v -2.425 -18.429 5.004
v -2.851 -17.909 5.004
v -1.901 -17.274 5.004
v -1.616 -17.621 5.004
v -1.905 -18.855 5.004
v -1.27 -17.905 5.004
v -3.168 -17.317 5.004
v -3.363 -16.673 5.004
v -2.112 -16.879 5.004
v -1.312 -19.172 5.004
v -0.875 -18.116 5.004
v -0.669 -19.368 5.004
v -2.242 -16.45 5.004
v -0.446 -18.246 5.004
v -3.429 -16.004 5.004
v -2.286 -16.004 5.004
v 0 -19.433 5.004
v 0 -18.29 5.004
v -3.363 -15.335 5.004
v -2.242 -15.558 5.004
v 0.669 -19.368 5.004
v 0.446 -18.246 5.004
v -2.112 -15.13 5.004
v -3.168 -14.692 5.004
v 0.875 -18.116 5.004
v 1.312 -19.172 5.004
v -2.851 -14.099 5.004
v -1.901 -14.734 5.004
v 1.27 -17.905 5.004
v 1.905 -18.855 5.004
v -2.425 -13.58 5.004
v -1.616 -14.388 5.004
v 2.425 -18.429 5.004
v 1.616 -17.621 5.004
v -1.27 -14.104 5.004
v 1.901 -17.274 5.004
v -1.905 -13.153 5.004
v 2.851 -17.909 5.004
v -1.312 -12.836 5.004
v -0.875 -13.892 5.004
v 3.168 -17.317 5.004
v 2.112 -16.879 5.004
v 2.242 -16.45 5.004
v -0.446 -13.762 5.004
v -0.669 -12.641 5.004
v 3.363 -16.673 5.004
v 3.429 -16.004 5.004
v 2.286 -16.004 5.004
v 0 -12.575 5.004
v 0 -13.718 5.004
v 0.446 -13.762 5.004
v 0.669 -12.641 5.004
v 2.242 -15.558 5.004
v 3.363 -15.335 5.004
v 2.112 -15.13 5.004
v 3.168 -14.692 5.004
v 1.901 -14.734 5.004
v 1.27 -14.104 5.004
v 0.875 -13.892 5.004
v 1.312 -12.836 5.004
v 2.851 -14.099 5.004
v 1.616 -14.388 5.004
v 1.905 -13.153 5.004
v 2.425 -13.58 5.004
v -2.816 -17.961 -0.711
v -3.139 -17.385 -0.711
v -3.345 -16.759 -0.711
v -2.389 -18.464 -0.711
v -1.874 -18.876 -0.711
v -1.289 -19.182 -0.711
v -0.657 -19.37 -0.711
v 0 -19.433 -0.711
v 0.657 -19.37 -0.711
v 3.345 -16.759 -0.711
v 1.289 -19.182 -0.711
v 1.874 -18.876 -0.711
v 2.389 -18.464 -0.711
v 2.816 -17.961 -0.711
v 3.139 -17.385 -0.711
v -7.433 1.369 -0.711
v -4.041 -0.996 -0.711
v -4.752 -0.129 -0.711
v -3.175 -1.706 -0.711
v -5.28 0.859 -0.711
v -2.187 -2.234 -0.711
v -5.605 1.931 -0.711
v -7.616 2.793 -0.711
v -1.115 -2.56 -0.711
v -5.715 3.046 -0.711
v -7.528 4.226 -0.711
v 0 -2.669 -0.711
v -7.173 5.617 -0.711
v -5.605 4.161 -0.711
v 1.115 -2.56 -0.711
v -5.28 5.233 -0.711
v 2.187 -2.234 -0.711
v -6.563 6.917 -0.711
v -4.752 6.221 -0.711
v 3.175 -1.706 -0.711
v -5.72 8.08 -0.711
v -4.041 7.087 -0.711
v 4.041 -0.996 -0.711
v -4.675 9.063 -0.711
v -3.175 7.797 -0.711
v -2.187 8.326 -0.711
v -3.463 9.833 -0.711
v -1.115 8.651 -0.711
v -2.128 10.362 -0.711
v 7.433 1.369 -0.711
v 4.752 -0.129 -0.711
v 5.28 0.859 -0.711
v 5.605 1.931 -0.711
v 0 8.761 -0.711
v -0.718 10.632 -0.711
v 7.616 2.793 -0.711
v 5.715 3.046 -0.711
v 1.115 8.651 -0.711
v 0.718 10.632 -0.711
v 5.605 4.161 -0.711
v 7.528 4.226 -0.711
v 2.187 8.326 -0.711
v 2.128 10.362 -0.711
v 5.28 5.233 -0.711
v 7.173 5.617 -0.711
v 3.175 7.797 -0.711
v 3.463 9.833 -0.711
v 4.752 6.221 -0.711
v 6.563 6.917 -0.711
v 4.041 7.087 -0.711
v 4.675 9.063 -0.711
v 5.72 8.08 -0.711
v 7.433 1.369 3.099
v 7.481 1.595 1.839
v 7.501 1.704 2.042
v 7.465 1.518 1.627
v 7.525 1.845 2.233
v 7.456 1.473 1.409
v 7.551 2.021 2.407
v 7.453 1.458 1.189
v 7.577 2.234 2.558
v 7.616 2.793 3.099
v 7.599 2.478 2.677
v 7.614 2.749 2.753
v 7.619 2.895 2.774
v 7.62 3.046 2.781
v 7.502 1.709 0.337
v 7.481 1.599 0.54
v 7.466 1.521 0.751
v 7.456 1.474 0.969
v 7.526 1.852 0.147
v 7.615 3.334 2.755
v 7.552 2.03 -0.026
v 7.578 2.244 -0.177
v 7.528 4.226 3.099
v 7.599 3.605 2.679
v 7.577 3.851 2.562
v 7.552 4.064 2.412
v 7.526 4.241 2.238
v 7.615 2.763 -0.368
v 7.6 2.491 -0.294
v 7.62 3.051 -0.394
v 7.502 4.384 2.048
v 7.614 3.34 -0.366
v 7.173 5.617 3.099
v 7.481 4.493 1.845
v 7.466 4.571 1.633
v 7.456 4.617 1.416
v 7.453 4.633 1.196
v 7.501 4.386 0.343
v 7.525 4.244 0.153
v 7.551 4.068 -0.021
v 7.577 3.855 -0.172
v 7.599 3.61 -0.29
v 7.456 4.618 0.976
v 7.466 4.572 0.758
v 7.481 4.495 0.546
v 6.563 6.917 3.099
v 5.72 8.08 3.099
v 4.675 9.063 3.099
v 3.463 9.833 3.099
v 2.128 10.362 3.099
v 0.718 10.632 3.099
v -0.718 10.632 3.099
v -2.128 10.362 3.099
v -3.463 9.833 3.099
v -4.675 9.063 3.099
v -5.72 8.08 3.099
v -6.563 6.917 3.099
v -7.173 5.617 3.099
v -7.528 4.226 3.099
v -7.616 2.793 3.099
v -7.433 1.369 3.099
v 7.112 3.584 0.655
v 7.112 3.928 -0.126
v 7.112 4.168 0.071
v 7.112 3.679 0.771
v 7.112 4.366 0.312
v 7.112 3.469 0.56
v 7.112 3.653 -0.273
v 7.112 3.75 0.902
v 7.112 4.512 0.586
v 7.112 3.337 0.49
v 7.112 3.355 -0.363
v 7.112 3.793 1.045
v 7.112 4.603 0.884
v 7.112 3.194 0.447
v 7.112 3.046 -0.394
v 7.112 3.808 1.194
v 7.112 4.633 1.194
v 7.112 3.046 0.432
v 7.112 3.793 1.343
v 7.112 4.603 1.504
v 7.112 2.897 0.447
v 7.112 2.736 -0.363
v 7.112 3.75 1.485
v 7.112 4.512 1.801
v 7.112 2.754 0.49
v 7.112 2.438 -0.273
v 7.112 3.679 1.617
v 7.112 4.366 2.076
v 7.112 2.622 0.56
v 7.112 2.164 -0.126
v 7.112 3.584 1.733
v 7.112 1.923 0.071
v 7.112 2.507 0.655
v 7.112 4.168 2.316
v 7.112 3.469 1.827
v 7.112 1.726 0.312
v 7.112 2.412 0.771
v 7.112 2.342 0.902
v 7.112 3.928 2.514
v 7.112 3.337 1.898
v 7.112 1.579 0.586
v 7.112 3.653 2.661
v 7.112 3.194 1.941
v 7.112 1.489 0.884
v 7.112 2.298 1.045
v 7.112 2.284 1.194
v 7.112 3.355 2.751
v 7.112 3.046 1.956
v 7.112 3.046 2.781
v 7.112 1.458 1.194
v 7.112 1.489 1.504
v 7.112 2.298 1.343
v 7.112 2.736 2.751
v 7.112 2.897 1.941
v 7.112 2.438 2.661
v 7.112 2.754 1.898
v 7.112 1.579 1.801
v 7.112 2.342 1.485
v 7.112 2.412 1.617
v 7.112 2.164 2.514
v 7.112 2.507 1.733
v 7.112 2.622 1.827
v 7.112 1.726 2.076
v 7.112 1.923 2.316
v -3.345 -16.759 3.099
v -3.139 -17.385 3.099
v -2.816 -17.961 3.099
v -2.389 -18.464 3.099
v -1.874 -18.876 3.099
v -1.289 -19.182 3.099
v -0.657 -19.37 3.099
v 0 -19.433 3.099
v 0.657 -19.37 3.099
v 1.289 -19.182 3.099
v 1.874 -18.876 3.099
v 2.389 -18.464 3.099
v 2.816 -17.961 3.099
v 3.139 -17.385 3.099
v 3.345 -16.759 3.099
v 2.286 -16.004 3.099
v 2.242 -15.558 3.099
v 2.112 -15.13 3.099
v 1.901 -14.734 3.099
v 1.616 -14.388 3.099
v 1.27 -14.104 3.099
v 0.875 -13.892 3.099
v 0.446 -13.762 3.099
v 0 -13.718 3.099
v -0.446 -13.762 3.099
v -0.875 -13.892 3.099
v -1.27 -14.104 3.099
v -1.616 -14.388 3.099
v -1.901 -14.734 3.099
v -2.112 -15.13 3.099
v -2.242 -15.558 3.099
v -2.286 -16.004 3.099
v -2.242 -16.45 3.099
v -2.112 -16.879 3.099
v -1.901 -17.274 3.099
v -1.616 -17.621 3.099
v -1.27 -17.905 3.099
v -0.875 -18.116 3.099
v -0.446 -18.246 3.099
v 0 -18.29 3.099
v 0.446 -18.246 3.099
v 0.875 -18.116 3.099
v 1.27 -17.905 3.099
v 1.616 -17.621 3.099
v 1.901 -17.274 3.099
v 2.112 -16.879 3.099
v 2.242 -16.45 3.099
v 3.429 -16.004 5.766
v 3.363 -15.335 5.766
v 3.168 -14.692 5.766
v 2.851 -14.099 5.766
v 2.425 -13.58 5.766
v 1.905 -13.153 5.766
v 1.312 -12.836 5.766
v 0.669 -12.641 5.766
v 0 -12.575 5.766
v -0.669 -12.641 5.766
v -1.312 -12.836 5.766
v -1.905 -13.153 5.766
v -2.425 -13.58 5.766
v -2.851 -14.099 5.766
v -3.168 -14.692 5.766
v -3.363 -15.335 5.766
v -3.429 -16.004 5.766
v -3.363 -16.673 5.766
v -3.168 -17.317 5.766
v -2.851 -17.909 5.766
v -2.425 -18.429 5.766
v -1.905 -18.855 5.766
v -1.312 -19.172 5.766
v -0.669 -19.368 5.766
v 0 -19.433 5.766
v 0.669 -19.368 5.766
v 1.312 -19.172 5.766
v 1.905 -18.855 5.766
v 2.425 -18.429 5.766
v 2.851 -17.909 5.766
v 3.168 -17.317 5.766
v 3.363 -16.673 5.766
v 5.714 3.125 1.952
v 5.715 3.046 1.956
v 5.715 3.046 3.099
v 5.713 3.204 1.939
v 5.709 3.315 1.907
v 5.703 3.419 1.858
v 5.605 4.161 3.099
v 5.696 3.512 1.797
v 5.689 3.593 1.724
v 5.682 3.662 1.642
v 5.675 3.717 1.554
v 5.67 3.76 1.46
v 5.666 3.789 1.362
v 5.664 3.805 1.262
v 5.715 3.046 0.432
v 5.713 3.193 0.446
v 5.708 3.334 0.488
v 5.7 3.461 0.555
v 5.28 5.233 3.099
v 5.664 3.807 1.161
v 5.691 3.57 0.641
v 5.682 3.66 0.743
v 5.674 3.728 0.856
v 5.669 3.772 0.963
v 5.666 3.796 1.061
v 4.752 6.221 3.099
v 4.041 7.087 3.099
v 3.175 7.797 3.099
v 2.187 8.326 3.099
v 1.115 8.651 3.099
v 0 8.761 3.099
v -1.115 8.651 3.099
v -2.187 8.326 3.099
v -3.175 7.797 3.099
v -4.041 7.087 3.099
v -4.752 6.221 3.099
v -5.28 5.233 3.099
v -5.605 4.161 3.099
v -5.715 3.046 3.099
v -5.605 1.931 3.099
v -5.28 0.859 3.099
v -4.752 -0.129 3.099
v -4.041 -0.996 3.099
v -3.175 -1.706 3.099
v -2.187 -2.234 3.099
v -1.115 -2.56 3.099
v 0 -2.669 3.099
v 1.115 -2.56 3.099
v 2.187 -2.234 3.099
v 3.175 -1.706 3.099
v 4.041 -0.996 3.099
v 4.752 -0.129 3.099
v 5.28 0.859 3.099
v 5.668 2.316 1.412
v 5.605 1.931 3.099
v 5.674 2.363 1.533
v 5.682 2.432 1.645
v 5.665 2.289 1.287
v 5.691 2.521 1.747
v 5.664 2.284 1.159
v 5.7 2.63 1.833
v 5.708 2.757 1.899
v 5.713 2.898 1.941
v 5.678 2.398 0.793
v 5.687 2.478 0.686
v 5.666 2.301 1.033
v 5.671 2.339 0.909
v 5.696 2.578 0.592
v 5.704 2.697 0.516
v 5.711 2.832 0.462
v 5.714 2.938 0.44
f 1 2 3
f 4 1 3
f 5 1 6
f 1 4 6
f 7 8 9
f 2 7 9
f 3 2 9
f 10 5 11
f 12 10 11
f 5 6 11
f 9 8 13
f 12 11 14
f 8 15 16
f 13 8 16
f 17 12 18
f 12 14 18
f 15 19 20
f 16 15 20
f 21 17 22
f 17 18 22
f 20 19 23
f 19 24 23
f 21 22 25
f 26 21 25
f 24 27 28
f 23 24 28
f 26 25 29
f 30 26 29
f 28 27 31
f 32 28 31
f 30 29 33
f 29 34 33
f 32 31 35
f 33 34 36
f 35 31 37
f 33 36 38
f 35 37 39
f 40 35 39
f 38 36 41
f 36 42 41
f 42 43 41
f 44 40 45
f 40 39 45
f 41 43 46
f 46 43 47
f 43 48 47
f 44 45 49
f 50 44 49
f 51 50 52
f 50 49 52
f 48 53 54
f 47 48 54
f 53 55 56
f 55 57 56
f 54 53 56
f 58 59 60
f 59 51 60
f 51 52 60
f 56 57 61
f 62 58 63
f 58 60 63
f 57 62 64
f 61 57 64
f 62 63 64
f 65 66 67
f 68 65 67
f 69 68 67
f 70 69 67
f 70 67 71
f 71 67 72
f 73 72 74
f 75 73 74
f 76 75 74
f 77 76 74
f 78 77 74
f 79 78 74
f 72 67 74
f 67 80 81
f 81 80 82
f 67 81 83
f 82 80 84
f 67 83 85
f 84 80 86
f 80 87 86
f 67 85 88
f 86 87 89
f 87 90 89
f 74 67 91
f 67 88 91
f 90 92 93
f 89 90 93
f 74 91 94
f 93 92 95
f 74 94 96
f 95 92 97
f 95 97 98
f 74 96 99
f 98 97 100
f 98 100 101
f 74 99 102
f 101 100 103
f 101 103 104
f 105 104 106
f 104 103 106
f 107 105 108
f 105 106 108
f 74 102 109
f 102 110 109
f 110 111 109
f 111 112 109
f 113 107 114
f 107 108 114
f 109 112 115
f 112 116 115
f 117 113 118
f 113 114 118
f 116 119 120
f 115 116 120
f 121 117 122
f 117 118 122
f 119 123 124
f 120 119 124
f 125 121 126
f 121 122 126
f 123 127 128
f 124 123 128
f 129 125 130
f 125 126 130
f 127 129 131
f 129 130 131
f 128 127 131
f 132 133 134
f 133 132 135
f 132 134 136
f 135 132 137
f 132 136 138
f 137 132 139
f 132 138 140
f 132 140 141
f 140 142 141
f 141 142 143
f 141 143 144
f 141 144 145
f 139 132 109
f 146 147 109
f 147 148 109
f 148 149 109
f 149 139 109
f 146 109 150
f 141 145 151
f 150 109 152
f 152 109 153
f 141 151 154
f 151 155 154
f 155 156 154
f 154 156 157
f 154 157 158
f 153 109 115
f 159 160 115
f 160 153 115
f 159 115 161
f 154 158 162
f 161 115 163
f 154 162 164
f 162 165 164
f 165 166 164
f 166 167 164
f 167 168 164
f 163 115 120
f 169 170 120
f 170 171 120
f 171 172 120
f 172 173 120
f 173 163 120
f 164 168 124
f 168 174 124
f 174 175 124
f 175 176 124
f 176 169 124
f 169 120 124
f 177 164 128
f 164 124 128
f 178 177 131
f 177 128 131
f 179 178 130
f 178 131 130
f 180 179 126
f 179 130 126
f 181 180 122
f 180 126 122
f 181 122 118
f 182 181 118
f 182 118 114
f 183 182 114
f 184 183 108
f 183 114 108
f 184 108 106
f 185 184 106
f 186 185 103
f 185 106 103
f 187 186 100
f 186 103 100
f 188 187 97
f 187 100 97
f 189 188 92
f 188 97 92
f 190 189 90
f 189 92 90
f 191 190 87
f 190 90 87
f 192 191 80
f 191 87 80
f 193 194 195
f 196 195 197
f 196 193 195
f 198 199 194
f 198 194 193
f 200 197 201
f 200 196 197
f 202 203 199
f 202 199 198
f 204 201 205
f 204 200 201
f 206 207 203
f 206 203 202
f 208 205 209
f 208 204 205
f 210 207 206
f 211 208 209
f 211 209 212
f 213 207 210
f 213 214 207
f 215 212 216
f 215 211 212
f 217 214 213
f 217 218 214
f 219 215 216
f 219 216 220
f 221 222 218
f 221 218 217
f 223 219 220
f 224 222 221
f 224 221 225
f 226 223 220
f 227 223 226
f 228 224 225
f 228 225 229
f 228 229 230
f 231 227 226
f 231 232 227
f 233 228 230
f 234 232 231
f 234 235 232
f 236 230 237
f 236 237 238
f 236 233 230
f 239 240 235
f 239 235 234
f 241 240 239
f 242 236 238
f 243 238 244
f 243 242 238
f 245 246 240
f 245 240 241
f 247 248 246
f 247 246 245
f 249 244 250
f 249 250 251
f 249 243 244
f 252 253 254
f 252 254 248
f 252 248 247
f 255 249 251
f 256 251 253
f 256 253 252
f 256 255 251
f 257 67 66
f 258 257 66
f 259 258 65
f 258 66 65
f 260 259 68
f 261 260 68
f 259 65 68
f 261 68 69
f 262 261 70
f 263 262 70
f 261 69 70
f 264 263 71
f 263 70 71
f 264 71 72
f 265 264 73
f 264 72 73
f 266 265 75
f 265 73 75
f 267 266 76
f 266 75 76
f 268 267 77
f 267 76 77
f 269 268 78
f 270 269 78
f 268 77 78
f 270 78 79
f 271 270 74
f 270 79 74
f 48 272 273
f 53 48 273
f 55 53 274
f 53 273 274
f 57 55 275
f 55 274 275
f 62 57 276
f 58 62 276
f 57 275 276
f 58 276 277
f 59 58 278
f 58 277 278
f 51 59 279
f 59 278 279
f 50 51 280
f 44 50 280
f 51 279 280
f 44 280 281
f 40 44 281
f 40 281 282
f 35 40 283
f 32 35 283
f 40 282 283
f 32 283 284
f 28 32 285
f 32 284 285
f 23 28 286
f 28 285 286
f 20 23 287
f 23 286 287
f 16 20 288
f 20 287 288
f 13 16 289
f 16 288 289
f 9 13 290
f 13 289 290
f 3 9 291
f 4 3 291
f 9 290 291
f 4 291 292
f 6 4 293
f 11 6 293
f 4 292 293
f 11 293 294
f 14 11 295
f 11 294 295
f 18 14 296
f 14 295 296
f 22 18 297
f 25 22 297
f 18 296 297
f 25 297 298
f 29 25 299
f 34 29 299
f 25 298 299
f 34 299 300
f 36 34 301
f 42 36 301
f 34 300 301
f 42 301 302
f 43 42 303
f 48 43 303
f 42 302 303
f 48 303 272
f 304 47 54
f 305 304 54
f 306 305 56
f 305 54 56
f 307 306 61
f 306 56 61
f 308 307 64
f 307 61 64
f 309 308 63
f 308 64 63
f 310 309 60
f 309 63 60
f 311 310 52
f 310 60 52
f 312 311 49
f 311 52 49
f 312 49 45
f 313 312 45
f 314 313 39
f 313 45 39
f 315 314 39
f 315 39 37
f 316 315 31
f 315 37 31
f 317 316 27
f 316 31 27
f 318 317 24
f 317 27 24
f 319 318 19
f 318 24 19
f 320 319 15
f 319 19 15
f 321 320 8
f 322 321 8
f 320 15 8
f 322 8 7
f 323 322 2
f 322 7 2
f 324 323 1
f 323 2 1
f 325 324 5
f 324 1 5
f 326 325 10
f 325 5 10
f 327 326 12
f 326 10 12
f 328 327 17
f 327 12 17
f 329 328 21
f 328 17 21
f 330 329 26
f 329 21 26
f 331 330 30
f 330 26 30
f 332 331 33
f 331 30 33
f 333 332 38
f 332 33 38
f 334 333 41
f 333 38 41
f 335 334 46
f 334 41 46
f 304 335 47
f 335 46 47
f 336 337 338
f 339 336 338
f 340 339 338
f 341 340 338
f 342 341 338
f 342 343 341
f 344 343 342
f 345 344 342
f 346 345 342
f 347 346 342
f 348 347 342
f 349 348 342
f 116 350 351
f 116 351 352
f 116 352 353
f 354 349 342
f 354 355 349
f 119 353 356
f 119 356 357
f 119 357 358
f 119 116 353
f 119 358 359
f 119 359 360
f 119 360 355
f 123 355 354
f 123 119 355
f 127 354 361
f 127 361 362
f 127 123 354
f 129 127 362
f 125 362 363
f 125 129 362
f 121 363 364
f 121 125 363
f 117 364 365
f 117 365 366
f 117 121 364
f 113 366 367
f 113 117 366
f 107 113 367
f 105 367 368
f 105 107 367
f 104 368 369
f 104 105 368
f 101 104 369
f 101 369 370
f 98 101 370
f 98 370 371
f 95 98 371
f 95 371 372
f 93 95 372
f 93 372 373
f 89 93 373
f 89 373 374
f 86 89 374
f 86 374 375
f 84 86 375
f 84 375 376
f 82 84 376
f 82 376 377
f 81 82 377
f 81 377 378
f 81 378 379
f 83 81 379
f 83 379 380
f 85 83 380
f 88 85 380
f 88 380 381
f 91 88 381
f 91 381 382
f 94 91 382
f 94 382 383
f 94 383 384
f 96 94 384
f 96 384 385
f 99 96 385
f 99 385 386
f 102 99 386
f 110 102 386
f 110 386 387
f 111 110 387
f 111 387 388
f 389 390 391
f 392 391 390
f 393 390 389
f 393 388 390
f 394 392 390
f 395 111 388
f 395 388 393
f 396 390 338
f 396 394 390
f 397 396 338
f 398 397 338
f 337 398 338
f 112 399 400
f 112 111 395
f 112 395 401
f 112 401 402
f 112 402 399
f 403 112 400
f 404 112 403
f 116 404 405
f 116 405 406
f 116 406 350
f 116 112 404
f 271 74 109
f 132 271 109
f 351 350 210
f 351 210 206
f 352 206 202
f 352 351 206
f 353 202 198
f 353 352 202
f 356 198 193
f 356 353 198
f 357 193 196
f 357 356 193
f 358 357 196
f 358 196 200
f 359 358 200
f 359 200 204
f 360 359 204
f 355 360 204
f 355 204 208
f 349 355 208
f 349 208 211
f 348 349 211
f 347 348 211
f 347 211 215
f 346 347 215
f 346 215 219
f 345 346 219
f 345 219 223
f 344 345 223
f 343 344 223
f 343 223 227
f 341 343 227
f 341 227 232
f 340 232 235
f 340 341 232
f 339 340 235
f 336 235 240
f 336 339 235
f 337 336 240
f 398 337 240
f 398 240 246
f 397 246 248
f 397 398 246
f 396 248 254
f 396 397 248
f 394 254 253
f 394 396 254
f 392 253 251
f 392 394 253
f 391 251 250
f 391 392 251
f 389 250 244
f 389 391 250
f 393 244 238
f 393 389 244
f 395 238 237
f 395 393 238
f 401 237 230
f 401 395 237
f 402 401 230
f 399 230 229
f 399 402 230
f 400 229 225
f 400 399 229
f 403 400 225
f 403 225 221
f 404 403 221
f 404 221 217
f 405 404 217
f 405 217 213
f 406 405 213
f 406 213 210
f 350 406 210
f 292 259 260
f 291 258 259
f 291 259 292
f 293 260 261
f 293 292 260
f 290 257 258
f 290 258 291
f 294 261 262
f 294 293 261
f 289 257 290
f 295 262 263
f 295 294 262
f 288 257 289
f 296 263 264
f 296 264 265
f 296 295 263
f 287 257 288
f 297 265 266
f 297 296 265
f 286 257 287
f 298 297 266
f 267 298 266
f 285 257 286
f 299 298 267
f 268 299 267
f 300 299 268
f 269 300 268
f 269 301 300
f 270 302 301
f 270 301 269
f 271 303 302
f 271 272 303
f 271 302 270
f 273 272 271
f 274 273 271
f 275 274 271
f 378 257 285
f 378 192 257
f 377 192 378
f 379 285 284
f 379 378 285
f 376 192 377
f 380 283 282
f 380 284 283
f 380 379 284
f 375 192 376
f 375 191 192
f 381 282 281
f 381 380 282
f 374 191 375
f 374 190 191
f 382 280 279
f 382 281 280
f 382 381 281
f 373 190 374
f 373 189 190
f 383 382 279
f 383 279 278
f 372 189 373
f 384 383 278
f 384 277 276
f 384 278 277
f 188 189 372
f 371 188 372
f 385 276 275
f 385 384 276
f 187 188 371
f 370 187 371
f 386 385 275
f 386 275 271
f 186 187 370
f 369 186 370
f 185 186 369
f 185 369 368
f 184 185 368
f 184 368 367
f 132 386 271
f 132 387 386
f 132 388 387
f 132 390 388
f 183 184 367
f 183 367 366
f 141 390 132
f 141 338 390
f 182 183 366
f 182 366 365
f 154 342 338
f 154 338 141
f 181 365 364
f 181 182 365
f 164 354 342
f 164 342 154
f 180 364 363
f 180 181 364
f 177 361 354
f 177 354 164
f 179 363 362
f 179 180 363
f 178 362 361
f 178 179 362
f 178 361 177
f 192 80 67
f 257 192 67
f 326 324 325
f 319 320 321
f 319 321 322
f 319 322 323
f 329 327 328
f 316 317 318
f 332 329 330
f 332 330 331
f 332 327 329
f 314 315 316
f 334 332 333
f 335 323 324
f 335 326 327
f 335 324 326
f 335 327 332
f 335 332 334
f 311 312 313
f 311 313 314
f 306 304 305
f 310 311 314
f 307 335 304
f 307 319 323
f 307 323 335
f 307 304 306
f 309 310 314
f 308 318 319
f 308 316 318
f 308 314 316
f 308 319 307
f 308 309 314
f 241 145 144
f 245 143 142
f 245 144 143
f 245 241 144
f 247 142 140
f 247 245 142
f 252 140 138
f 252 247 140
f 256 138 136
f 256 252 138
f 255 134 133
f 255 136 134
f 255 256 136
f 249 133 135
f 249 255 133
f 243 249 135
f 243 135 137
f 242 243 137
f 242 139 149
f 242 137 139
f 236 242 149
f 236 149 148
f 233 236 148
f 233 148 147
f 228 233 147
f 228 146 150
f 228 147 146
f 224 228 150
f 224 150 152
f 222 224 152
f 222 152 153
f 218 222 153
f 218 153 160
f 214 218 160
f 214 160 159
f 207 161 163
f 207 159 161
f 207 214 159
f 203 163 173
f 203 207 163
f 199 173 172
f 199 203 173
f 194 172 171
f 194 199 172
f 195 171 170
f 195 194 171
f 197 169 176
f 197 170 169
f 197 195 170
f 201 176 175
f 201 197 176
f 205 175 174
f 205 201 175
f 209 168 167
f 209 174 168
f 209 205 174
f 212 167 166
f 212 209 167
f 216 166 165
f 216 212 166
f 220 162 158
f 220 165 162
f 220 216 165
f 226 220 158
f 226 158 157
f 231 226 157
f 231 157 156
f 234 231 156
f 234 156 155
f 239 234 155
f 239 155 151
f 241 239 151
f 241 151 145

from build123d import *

# Parameters (mm, degrees)
SKETCH1_R           = 5.08
SKETCH1_R_2         = 3.81
SKETCH1_R_3         = 2.286
BOSS_EXTRUDE1_DEPTH = 2.54
SKETCH2_R           = 1.524
BOSS_EXTRUDE2_DEPTH = 1.27
SKETCH3_R           = 2.286
BOSS_EXTRUDE3_DEPTH = 0.508
SCALE1_SCALE        = 1.5
CUT_EXTRUDE1_START  = 7.112
SKETCH4_R           = 1.5875
CUT_EXTRUDE1_DEPTH  = 10
SKETCH5_R           = 0.762
CUT_EXTRUDE2_DEPTH  = 22.655627009


with BuildPart() as part:
    # Sketch1 → Boss-Extrude1 (new body)
    # profile 1 of 3: a face of its own
    with BuildSketch(Plane.XY):
        Circle(SKETCH1_R)
        Circle(SKETCH1_R_2, mode=Mode.SUBTRACT)
    # profile 2 of 3: a face of its own
    with BuildSketch(Plane.XY):
        with BuildLine():
            ThreePointArc((4.955539349, -1.1176), (0, -5.08), (-4.955539349, -1.1176))
            Line((-4.955539349, -1.1176), (-2.229992707, -13.20292))
            ThreePointArc((-2.229992707, -13.20292), (-0.253014497, -10.428044969), (2.286, -12.7))
            ThreePointArc((2.286, -12.7), (2.271955031, -12.953014497), (2.229992707, -13.20292))
            Line((2.229992707, -13.20292), (4.955539349, -1.1176))
        make_face()
    # profile 3 of 3: a face of its own
    with BuildSketch(Plane.XY):
        with Locations((0, -12.7)):
            Circle(SKETCH1_R_3)
    extrude(amount=BOSS_EXTRUDE1_DEPTH)

    # Sketch2 → Boss-Extrude2 (add)
    with BuildSketch(Plane.XY.offset(2.54)):
        with Locations((0, -12.7)):
            Circle(SKETCH2_R)
    extrude(amount=BOSS_EXTRUDE2_DEPTH)

    # Sketch3 → Boss-Extrude3 (add)
    with BuildSketch(Plane.XY.offset(3.81)):
        with Locations((0, -12.7)):
            Circle(SKETCH3_R)
    extrude(amount=BOSS_EXTRUDE3_DEPTH)


with BuildPart() as part_1:
    # Scale1: scaled about (0, -6.091225053, 1.422264494)
    add(part.part.scale(SCALE1_SCALE).moved(Location((0, 3.045612526, -0.711132247))))

    # Sketch4 → Cut-Extrude1 (cut)
    with BuildSketch(Plane(origin=(0, 0, 0), x_dir=(0, 0, -1), z_dir=(1, 0, 0)).offset(CUT_EXTRUDE1_START)):
        with Locations(Location((-1.193867753, 3.045612527, 0), (0, 0, 180))):
            Circle(SKETCH4_R)
    extrude(amount=CUT_EXTRUDE1_DEPTH, mode=Mode.SUBTRACT)

    # Sketch5 → Cut-Extrude2 (cut, through all)
    with BuildSketch(Plane(origin=(0, 0, 0), x_dir=(0, 0, -1), z_dir=(1, 0, 0))):
        with Locations((-1.193867753, 3.045612527)):
            Circle(SKETCH5_R)
    extrude(amount=CUT_EXTRUDE2_DEPTH, mode=Mode.SUBTRACT)


solid = part_1.part
